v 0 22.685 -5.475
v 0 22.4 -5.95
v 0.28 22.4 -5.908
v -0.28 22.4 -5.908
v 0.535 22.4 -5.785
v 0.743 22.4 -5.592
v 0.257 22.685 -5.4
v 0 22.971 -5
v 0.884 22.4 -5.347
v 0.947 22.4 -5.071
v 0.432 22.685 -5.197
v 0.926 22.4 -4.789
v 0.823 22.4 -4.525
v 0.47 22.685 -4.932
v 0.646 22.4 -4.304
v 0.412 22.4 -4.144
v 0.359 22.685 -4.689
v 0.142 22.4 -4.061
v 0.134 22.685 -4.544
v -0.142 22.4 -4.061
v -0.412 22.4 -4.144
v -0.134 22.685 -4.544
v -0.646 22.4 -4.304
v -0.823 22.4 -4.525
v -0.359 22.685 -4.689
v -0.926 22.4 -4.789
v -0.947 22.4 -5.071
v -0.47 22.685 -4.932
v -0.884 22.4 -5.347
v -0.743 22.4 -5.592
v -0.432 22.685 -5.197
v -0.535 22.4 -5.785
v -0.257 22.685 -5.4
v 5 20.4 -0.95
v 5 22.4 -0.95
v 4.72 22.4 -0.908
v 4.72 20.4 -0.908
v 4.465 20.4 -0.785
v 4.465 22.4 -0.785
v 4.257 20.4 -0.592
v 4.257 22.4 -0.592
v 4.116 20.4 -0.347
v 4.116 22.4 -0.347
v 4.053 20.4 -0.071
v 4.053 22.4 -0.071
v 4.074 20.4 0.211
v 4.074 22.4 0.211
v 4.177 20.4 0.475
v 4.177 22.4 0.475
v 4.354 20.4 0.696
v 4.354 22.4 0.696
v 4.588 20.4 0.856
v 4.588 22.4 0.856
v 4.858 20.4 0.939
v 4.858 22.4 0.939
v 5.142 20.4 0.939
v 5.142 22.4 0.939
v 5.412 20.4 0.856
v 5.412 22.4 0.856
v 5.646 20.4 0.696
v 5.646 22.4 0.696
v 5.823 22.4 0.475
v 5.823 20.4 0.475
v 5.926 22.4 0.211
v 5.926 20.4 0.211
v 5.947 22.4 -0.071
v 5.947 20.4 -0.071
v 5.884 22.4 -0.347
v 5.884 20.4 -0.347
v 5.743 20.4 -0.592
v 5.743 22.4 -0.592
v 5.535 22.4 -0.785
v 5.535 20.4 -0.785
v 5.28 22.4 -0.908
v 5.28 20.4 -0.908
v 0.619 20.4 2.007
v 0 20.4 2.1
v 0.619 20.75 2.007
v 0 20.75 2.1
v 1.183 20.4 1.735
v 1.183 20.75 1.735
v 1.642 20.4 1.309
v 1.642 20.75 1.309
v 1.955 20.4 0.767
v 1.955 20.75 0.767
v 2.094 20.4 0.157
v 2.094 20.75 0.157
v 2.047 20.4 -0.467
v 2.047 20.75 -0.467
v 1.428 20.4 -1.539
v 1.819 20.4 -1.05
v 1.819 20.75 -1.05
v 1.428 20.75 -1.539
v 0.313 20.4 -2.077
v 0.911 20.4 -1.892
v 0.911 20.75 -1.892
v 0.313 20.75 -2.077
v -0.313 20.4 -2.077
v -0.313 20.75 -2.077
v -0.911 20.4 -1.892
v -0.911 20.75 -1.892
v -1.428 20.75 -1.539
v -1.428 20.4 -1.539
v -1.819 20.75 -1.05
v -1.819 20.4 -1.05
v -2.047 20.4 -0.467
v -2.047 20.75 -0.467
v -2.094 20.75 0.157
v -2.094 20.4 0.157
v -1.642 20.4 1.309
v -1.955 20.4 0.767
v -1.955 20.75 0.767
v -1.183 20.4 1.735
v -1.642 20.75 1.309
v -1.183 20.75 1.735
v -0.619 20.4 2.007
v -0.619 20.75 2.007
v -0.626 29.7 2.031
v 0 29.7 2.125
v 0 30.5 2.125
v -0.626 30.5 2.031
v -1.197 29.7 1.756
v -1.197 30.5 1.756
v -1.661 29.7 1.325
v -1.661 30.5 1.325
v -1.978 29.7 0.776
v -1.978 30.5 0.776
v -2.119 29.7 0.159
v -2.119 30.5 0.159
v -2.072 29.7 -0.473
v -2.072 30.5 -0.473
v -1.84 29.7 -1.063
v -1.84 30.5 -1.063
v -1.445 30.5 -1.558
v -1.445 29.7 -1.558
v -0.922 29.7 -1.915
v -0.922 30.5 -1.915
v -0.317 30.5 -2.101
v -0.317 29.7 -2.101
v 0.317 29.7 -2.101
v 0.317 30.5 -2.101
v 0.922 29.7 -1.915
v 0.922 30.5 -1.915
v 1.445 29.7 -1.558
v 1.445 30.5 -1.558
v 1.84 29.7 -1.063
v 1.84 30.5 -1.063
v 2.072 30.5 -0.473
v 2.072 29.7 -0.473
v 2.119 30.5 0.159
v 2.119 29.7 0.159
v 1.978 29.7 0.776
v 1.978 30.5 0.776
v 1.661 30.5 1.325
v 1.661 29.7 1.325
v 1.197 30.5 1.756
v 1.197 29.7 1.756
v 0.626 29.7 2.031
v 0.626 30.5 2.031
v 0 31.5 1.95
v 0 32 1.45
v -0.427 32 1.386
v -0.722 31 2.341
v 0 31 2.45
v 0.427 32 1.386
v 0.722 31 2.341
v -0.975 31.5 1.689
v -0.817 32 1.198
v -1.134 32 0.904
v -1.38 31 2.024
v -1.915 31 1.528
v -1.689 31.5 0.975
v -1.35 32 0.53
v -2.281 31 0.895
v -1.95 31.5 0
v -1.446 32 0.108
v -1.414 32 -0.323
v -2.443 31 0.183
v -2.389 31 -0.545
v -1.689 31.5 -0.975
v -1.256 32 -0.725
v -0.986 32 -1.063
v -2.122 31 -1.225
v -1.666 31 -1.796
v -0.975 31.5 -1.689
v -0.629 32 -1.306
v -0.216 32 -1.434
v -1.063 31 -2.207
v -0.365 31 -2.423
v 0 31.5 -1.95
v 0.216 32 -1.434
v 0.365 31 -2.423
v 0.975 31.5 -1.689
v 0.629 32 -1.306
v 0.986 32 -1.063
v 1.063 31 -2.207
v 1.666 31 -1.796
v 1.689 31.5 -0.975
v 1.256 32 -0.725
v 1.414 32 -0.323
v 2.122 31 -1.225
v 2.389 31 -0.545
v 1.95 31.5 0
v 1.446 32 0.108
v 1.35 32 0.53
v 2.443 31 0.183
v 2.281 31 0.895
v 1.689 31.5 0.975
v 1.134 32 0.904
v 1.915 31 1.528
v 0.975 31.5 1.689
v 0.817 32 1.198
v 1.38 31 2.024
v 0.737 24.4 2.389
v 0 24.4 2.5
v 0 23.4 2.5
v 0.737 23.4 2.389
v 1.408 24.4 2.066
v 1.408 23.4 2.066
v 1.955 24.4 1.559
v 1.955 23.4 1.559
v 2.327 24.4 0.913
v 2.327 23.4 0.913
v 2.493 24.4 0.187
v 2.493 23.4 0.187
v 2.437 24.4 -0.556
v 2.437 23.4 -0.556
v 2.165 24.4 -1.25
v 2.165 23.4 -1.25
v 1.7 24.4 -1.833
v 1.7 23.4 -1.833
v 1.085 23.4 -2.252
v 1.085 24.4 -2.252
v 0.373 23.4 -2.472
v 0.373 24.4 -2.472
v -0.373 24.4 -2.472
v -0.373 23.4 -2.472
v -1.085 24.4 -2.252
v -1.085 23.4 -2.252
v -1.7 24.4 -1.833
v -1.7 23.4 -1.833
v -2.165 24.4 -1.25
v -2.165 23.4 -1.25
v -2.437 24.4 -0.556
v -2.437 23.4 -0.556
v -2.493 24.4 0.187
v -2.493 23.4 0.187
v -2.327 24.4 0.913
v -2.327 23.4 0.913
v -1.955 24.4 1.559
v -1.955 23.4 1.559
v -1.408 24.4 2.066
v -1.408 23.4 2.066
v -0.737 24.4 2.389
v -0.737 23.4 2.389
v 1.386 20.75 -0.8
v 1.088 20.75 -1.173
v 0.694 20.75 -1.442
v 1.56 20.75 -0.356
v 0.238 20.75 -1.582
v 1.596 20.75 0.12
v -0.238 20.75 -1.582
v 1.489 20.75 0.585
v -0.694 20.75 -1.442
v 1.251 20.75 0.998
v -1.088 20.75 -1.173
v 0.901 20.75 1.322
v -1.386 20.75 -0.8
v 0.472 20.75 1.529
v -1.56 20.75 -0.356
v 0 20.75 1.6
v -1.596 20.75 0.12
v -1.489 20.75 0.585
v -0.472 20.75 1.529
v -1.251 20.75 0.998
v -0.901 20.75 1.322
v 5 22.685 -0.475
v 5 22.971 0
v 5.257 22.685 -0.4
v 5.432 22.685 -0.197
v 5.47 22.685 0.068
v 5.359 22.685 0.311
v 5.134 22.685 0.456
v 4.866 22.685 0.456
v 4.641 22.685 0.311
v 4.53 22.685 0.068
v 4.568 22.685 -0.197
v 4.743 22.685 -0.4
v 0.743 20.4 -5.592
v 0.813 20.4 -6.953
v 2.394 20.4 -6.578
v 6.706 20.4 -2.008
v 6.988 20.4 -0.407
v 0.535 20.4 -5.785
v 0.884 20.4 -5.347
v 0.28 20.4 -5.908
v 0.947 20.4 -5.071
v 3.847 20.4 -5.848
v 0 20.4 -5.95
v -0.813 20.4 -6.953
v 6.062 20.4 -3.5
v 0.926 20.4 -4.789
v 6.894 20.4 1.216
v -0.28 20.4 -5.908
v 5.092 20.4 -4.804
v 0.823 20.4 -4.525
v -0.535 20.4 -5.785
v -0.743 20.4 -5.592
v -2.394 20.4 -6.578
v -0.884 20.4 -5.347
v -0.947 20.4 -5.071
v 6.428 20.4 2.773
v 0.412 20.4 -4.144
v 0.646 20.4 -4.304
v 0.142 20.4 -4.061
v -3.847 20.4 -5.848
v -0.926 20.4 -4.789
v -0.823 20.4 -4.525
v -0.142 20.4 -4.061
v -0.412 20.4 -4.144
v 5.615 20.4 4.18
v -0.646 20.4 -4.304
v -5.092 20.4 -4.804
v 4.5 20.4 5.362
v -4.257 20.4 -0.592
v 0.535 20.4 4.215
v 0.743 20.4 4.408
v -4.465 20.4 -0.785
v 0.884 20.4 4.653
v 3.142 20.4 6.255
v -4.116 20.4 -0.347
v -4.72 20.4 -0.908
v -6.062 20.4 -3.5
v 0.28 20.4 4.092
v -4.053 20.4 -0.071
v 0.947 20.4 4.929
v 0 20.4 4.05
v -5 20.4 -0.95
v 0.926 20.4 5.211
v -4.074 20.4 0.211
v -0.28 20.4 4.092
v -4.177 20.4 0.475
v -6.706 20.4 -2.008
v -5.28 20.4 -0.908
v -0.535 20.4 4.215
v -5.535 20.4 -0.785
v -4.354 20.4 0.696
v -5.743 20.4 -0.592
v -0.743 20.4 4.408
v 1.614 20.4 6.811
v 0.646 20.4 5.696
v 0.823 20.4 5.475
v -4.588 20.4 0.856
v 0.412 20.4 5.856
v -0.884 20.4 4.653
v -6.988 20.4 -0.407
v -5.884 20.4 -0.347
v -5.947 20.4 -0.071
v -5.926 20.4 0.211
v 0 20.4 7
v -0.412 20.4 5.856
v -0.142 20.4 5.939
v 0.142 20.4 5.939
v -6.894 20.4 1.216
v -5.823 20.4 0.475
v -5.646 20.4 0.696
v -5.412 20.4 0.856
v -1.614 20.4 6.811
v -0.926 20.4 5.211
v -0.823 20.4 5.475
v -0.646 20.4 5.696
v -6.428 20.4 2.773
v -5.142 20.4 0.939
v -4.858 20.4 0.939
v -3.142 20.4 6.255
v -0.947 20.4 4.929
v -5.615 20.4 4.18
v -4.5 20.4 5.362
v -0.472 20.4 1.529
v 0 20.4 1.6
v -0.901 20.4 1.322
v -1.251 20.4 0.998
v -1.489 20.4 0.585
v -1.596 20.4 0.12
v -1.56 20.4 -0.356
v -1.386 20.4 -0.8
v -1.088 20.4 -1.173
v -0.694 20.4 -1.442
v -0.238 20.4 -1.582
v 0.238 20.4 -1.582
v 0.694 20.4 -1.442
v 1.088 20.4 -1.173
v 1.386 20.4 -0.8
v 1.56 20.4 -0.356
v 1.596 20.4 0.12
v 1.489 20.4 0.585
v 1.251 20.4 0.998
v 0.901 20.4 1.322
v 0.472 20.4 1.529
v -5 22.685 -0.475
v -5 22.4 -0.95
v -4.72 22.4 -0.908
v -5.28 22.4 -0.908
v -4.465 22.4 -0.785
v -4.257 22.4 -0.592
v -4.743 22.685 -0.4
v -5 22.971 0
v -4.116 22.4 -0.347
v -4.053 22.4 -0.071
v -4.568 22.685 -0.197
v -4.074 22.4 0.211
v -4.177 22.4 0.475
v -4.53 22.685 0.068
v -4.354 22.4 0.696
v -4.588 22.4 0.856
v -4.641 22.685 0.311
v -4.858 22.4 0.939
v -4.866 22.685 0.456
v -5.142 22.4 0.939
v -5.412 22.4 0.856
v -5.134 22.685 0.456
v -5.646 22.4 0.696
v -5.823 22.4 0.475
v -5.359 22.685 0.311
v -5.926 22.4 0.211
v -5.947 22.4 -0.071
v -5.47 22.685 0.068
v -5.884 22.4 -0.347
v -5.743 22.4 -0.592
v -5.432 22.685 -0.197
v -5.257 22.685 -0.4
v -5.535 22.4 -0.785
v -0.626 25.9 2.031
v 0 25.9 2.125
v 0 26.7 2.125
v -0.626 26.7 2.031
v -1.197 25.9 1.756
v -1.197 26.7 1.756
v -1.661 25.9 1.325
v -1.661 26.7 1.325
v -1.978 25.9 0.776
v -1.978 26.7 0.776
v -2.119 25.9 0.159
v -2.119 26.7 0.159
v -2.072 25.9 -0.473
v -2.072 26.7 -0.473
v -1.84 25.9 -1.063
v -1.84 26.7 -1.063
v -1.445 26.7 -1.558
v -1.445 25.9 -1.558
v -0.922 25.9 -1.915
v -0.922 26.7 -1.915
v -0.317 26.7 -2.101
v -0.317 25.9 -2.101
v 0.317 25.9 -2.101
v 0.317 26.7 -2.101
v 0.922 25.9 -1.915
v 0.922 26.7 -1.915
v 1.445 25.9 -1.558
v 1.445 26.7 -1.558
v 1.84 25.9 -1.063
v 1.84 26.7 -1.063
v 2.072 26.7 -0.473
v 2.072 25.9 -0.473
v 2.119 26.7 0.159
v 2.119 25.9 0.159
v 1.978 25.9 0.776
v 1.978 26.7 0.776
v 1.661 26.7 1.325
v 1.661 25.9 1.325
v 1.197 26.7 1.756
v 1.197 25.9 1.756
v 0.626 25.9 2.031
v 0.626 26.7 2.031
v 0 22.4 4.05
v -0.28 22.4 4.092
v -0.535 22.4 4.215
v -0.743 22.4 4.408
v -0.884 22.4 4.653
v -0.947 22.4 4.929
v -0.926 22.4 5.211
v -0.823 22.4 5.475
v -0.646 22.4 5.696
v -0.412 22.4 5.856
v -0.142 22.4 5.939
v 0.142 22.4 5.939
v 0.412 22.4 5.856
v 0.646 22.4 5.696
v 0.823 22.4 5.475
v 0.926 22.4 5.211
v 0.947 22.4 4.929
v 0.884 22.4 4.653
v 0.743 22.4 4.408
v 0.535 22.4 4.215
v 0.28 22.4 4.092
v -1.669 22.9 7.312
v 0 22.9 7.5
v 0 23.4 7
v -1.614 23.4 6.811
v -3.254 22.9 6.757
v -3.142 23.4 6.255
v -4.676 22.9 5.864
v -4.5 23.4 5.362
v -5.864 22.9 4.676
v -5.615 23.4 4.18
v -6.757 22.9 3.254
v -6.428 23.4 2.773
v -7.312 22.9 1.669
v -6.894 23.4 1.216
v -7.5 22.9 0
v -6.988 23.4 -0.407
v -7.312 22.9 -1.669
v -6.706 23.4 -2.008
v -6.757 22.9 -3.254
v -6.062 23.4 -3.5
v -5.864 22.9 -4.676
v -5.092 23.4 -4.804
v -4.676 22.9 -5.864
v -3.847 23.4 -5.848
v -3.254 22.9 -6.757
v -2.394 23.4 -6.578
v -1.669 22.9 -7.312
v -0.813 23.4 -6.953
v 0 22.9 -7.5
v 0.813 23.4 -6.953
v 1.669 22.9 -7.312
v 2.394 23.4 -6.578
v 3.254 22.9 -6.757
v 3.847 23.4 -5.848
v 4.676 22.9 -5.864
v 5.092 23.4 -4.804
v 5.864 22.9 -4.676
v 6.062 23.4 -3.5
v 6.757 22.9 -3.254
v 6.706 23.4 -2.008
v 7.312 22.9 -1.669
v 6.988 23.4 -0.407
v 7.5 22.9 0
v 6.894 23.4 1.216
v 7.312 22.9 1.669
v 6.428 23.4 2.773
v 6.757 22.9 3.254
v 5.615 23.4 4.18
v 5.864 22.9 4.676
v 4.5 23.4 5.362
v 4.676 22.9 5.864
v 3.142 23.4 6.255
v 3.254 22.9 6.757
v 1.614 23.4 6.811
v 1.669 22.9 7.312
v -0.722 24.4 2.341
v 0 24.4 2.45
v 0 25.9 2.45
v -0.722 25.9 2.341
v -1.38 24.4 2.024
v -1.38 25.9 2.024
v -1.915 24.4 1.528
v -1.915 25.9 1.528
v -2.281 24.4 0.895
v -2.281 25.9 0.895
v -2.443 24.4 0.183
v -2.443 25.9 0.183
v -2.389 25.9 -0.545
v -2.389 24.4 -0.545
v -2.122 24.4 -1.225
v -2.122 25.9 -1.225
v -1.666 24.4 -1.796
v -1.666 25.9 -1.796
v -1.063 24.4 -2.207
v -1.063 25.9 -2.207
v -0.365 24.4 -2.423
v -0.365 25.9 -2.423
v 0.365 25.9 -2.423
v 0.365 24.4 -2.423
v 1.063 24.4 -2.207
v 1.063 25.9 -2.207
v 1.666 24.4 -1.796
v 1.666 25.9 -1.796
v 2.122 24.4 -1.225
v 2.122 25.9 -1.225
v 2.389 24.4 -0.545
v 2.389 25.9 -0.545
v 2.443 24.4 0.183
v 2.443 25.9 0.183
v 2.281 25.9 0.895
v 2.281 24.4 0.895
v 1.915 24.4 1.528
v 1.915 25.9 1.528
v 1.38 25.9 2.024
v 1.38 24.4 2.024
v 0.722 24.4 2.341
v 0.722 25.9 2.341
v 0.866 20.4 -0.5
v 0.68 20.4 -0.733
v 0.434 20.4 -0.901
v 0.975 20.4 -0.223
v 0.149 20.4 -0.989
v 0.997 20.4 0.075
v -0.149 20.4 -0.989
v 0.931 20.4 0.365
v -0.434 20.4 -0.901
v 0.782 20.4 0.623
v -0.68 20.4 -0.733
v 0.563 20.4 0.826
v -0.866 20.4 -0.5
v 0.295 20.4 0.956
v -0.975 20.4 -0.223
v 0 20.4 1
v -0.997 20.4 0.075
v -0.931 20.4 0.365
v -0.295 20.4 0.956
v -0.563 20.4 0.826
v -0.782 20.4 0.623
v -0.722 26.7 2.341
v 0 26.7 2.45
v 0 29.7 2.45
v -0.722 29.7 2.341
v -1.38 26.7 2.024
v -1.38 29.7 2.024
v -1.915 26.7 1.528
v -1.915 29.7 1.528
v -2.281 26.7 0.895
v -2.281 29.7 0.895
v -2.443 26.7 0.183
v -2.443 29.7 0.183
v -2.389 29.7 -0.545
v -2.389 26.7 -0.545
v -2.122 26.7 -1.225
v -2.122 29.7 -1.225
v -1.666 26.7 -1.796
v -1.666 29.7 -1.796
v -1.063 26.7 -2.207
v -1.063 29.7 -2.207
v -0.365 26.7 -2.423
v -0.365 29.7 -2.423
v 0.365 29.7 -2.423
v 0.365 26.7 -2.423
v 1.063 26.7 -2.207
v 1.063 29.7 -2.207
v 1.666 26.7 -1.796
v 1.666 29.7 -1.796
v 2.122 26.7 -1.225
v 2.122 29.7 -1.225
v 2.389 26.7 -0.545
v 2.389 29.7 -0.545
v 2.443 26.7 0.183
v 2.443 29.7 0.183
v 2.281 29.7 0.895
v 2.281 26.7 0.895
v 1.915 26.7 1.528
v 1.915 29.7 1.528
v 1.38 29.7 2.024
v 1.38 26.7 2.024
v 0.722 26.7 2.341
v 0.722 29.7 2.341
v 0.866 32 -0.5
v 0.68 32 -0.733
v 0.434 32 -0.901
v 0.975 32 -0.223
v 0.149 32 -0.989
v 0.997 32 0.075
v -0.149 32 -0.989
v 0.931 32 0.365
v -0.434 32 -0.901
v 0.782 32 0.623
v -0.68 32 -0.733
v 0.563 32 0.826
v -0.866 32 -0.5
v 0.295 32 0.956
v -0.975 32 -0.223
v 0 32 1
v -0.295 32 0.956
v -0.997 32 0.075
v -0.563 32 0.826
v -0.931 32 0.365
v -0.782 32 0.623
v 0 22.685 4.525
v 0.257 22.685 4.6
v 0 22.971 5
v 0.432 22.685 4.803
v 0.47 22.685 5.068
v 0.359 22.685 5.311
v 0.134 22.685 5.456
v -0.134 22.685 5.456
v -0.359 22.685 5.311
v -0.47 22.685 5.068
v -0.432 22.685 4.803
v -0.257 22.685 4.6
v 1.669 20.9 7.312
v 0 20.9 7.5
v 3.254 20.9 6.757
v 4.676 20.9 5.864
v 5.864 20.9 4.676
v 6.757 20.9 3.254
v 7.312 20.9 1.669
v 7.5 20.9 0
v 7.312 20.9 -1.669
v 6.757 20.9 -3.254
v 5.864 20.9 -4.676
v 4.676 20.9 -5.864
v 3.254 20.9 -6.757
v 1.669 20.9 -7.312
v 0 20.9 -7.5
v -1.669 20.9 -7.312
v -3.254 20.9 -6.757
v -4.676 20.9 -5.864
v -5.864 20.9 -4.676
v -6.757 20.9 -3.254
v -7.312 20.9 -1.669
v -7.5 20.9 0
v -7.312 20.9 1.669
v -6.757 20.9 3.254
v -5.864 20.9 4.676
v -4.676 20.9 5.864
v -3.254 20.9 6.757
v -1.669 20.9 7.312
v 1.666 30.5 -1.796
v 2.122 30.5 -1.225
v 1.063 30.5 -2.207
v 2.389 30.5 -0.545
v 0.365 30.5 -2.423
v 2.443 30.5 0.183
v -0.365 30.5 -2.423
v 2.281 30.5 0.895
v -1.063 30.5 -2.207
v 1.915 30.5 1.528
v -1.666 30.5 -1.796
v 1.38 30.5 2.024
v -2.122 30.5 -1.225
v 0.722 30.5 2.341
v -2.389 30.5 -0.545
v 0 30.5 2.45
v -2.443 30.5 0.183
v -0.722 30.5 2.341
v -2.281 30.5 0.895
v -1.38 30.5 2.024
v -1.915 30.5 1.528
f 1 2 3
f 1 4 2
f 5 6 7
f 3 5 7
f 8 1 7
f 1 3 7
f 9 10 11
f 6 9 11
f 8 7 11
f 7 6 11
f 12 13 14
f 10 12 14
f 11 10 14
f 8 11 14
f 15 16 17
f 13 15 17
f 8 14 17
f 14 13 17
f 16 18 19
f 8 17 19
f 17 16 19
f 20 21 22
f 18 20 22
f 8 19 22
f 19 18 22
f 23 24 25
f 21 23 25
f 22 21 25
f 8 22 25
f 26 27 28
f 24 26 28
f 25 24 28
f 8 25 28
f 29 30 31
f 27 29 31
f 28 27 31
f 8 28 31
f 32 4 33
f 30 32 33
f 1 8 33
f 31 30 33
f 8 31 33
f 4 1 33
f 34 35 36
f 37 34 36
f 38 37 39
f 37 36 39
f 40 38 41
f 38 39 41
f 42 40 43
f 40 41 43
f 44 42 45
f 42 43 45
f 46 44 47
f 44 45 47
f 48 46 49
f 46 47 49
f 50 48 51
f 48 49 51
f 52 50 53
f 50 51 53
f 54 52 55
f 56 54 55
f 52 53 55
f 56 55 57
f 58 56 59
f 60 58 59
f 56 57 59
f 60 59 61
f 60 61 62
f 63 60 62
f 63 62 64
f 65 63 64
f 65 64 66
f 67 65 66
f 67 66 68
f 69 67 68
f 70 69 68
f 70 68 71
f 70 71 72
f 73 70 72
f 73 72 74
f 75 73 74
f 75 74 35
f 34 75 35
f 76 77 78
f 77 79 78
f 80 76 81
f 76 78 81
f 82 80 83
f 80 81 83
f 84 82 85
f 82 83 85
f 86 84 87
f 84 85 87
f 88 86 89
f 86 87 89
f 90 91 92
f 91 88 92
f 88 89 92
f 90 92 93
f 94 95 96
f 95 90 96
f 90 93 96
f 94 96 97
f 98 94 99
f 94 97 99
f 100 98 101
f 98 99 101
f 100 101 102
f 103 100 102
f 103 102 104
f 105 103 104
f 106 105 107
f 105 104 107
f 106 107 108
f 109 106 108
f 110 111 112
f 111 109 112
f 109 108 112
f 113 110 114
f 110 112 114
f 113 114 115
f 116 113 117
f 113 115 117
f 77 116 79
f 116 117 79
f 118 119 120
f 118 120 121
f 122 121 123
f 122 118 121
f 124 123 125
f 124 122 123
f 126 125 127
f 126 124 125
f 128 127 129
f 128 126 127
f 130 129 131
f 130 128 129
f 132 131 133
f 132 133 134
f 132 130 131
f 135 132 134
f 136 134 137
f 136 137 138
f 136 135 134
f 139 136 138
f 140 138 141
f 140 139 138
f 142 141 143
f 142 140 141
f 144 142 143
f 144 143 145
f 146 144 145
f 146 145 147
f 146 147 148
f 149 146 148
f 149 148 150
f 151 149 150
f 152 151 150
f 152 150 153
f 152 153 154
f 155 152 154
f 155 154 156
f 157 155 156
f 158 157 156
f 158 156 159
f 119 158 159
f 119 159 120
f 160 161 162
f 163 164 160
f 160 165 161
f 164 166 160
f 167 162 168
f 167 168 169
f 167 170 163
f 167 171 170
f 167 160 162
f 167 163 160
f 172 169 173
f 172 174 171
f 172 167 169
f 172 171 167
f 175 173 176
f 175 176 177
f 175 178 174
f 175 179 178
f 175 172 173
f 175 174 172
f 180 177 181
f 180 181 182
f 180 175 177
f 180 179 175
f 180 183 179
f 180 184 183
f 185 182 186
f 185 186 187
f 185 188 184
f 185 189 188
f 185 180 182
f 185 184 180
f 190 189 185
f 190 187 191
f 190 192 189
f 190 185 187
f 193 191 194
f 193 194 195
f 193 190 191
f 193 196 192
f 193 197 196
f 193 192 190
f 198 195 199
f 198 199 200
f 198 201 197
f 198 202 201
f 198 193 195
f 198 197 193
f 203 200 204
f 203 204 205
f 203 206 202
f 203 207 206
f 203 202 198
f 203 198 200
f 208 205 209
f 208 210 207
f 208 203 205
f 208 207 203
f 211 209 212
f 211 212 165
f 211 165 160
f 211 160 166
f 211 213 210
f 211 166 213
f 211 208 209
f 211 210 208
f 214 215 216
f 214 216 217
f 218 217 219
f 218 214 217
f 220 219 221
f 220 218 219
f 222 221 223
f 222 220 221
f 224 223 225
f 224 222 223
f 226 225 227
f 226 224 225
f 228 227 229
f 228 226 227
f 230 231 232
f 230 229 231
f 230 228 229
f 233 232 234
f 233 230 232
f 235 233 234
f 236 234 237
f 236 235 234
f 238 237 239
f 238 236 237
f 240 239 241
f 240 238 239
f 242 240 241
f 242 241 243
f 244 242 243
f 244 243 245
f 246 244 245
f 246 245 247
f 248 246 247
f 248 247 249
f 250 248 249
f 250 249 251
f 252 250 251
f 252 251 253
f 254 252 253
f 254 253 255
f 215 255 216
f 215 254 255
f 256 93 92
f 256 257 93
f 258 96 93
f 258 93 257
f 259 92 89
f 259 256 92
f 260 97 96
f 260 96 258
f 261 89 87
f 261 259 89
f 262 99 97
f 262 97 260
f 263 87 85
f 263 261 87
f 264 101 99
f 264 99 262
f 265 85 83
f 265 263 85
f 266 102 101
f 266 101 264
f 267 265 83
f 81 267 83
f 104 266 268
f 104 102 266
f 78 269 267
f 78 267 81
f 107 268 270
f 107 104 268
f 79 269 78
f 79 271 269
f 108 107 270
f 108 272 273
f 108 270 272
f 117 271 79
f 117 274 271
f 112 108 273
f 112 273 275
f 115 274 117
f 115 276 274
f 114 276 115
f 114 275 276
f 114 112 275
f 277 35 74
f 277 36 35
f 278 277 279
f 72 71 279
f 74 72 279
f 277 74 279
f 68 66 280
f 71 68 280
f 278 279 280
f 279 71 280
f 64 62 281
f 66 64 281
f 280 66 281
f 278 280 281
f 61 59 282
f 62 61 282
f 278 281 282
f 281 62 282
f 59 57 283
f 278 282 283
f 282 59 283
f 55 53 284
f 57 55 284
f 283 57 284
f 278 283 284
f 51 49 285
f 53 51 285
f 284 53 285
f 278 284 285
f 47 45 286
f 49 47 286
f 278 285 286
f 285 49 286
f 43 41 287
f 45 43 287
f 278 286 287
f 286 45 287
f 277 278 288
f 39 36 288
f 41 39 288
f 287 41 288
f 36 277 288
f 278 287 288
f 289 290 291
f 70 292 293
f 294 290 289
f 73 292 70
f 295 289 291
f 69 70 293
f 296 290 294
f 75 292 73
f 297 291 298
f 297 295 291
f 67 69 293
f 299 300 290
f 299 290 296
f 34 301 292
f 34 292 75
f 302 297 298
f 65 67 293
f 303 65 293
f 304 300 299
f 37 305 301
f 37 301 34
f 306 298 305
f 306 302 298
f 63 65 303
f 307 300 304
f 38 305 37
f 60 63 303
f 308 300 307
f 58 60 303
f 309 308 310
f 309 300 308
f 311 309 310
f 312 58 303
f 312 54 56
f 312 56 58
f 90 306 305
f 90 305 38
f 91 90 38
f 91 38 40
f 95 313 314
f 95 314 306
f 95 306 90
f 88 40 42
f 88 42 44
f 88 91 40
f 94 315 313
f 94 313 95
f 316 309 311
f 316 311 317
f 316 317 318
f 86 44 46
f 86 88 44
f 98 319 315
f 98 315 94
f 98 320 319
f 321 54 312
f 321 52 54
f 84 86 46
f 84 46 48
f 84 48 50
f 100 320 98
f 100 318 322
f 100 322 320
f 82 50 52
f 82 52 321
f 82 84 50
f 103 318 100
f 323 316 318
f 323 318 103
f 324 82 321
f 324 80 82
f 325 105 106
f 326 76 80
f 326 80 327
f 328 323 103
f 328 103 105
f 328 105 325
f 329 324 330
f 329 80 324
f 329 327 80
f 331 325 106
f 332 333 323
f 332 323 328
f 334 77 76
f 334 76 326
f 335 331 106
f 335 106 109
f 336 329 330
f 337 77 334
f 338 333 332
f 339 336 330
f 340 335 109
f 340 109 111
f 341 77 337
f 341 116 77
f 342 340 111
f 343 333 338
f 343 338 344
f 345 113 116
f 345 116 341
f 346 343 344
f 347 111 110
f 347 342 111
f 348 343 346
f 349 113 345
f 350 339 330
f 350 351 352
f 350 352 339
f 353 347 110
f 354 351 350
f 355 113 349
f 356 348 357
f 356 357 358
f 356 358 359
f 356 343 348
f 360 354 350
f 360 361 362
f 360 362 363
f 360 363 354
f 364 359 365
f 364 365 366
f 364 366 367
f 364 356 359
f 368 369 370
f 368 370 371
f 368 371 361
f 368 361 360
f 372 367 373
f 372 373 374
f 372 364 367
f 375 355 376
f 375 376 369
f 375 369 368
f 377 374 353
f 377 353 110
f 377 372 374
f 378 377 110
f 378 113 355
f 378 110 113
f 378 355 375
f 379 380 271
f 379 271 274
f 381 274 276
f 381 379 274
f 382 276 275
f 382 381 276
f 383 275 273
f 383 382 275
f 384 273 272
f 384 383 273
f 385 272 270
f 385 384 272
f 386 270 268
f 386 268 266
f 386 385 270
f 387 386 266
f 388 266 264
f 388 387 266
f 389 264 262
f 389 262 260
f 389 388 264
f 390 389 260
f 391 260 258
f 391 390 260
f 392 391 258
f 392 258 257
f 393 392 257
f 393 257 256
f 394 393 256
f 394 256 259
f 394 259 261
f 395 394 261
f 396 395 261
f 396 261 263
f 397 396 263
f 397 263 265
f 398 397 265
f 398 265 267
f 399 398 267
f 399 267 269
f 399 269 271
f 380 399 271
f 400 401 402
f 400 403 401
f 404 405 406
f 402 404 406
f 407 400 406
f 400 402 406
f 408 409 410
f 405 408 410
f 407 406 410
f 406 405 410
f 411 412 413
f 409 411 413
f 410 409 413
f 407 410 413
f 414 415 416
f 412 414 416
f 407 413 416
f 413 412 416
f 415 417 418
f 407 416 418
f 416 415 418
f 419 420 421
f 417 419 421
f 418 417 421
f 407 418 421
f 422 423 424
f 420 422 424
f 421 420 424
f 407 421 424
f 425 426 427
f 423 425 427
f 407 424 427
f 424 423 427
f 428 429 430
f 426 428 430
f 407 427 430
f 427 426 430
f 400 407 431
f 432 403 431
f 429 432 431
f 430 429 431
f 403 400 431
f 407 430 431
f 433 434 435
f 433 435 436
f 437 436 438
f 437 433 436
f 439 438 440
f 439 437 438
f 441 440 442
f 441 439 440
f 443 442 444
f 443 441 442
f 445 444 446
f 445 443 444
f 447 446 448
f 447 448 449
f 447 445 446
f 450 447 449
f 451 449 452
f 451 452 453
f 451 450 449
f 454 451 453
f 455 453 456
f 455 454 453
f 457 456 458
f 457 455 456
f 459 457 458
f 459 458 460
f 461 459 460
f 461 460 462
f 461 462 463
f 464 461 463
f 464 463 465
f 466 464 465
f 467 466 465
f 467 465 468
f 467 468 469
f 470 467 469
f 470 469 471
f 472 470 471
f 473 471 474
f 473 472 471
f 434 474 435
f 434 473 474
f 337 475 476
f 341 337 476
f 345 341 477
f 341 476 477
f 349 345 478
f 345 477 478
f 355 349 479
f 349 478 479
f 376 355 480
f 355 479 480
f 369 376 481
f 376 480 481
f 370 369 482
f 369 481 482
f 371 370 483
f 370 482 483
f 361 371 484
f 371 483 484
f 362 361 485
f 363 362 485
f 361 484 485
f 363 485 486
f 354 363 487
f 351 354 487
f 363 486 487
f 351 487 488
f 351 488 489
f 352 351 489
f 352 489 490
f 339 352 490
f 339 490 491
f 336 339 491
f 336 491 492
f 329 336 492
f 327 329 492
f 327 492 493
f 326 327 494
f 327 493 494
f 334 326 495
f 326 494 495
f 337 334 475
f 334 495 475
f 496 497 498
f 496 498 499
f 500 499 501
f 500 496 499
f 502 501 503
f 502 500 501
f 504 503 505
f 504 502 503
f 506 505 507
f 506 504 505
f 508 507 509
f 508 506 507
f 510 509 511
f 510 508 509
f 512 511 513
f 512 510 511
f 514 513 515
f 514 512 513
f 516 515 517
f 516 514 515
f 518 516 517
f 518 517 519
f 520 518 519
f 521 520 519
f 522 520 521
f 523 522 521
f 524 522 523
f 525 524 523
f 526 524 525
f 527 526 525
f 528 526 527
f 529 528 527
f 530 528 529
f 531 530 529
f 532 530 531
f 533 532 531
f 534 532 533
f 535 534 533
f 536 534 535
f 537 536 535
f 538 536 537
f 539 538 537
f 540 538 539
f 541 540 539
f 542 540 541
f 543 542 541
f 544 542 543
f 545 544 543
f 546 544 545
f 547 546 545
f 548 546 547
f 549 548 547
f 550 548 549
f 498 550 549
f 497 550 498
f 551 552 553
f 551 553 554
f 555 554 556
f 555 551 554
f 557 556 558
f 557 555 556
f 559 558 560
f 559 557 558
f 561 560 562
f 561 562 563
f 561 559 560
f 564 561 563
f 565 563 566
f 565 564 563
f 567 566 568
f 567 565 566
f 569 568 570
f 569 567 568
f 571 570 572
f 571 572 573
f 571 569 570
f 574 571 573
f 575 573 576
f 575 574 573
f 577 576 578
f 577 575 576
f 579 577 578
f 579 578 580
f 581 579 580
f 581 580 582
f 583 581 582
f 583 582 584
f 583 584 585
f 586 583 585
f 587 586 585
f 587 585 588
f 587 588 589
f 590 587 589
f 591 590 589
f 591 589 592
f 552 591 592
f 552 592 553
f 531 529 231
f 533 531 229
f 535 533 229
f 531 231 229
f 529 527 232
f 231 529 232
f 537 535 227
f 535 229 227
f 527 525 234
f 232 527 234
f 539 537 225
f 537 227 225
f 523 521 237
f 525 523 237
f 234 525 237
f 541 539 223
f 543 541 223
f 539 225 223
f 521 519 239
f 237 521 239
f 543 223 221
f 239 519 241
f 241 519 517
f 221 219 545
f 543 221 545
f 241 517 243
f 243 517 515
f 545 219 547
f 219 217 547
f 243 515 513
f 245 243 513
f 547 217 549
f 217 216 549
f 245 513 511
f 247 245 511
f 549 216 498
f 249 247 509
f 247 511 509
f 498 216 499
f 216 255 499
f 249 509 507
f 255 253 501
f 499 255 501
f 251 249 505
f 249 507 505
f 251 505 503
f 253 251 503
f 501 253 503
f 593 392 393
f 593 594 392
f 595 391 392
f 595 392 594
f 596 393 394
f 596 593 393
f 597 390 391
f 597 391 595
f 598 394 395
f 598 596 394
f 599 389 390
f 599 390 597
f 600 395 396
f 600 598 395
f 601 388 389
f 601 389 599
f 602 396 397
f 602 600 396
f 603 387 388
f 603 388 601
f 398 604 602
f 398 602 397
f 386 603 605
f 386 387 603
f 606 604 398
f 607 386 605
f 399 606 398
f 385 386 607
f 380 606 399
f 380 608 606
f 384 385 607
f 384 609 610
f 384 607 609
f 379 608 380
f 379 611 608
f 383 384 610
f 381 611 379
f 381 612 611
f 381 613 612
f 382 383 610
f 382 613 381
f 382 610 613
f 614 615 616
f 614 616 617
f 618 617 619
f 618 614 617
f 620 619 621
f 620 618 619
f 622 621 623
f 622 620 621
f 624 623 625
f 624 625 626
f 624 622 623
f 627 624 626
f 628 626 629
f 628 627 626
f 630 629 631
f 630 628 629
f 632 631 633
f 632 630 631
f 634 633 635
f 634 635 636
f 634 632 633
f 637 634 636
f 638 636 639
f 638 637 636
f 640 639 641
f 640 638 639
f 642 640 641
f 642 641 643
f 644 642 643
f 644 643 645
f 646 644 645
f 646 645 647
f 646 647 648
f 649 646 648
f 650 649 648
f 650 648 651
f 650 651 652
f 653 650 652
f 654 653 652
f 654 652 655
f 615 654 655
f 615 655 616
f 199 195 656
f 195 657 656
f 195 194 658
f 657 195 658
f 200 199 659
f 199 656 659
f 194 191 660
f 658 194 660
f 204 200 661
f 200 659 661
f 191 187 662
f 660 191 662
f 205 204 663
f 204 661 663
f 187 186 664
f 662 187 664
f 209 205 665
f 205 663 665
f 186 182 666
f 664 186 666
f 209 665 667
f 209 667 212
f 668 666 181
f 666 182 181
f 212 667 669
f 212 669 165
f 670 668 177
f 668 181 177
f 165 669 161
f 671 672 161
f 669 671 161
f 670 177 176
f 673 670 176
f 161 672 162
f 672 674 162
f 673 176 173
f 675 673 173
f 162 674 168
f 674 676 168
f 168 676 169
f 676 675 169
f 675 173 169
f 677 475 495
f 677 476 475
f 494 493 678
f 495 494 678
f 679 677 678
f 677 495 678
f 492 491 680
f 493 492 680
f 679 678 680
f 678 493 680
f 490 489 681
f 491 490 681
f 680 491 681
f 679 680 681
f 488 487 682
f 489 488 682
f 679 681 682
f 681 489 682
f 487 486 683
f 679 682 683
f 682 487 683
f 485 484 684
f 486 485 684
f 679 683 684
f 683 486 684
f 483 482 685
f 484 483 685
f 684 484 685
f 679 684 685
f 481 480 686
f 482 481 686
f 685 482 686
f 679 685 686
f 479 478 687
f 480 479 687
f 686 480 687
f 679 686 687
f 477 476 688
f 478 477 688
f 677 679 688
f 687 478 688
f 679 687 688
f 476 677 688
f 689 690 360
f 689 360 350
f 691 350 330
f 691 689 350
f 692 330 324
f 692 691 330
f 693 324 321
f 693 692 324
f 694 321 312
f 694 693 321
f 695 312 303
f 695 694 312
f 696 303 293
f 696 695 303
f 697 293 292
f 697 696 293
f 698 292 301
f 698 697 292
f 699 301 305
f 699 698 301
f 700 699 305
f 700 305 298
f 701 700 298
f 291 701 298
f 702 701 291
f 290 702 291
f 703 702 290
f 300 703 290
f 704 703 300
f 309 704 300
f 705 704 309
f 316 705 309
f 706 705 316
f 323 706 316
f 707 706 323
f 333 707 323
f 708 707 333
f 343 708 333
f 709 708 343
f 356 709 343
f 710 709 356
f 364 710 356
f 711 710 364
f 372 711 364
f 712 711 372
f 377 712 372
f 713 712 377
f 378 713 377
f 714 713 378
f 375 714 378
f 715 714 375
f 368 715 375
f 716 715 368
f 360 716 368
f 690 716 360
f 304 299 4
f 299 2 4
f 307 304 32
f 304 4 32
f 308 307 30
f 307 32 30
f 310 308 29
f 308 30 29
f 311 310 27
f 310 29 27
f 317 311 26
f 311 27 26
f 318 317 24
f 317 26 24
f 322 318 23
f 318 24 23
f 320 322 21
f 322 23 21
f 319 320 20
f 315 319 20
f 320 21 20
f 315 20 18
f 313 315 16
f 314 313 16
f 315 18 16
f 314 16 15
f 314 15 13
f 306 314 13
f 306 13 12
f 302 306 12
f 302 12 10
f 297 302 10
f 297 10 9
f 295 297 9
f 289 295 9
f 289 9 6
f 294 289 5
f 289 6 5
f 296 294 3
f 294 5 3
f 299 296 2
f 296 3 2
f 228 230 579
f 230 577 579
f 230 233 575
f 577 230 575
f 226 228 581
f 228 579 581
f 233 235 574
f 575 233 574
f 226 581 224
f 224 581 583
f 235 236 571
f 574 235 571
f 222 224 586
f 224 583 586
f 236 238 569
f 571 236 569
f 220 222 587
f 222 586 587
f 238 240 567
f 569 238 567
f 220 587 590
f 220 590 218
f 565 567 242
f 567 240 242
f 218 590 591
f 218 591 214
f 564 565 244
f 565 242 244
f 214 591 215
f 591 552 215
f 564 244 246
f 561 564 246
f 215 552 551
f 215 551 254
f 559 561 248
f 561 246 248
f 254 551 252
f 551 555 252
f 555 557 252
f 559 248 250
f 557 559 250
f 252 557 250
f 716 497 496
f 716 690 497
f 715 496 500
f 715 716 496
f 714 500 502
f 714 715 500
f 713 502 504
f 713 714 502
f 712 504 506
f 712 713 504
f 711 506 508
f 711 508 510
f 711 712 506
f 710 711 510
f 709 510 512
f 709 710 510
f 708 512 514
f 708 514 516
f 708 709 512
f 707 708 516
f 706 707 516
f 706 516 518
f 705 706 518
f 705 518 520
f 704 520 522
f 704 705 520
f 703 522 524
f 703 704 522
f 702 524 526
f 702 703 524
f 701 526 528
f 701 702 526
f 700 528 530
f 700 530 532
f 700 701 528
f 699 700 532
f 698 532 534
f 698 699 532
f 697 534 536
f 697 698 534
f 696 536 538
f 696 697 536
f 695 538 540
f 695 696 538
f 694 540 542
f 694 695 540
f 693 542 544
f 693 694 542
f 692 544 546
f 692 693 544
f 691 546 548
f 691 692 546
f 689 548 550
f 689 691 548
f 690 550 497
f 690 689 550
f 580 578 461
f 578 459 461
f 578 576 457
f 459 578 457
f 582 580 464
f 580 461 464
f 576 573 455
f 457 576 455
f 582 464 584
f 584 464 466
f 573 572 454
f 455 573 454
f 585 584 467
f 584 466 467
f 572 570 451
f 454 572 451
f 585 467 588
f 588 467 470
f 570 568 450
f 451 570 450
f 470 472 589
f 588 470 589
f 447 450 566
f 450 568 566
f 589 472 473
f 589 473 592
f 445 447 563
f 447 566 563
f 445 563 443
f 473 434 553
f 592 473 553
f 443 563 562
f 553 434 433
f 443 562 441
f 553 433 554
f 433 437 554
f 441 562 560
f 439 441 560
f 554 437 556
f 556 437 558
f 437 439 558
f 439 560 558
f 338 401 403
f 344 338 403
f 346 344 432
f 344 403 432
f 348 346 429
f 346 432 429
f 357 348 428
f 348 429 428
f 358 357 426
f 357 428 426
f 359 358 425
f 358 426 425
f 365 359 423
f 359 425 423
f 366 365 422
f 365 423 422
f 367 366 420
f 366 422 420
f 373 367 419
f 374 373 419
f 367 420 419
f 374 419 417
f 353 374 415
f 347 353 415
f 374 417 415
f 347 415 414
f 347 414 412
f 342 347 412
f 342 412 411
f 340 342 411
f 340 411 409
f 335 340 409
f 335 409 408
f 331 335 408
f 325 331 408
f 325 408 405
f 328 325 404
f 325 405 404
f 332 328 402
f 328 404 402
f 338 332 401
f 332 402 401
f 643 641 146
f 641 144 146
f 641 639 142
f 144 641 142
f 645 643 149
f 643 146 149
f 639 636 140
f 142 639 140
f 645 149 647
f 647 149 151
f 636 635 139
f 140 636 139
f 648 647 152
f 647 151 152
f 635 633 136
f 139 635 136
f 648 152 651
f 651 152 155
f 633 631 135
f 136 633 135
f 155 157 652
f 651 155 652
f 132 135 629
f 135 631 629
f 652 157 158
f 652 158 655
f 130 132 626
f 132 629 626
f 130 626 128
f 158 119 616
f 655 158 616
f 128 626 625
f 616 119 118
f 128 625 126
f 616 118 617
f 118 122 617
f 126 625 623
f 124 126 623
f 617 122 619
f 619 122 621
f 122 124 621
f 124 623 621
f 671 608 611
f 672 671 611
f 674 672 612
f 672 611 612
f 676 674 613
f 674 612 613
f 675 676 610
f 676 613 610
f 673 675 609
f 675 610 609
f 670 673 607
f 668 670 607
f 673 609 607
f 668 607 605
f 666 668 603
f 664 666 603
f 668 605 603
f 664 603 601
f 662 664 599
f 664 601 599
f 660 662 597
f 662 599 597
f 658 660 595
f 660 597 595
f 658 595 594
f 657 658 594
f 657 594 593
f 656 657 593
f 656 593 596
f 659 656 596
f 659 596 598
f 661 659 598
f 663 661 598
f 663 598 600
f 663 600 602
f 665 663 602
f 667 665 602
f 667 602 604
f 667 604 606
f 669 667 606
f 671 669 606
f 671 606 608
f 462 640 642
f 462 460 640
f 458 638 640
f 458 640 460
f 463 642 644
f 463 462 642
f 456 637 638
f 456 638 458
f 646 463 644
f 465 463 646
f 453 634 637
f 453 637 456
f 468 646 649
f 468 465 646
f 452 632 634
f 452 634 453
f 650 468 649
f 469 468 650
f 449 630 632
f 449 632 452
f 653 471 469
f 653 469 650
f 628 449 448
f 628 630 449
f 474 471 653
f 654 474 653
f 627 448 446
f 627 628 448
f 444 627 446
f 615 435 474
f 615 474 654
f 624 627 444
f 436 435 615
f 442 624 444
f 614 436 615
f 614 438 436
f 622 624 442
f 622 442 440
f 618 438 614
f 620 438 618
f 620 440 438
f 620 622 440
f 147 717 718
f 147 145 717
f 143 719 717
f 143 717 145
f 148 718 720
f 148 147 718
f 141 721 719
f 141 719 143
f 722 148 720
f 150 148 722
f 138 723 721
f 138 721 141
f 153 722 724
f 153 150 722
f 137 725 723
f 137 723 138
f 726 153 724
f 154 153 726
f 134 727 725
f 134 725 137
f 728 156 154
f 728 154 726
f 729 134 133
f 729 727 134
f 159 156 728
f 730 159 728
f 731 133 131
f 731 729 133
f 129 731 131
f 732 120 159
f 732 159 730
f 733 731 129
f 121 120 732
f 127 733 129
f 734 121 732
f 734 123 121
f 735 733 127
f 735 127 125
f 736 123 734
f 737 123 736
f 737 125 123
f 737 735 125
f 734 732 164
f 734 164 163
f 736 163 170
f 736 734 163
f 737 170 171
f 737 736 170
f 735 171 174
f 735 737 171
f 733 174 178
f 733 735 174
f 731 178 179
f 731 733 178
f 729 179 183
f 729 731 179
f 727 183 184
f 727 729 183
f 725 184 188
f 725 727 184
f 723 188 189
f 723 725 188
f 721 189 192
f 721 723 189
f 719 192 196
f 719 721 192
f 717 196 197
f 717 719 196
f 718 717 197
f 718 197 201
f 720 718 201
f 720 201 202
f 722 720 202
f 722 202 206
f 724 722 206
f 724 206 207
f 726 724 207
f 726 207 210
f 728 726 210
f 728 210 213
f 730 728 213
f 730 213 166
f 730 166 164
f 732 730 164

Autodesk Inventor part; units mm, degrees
sketch "Sketch1" plane through (0, 0, 0) normal (1, 0, 0) x (0, 1, 0)
  line L0 (20.75, 2.1) -> (20.75, 1.7)
  line L1 (20.4, 1.6) -> (20.4, 0)
  line L2 (31, 0) -> (20.4, 0)
  line L3 (23.4, 7.5) -> (20.4, 7.5)
  line L4 (20.4, 7.5) -> (20.4, 2.2)
  line L5 (20.75, 1.95) -> (20.75, 1.7)
  line L6 (20.75, 1.7) -> (20.75, 1.65)
  line L7 (20.4, 2.2) -> (20.4, 2.15)
  line L8 (20.75, 1.65) -> (20.75, 1.6)
  line L9 (20.75, 1.6) -> (20.4, 1.6)
  line L10 (20.4, 2.15) -> (20.4, 2.1)
  line L11 (20.4, 2.1) -> (20.75, 2.1)
  line L12 (31, 0) -> (32, 0)
  line L13 (32, 0) -> (32, 2.45)
  line L14 (32, 2.45) -> (30.5, 2.45)
  line L15 (30.5, 2.45) -> (30.5, 2.125)
  line L16 (30.5, 2.125) -> (29.7, 2.125)
  line L17 (29.7, 2.125) -> (29.7, 2.45)
  line L18 (29.7, 2.45) -> (26.7, 2.45)
  line L19 (26.7, 2.45) -> (26.7, 2.125)
  line L20 (26.7, 2.125) -> (25.9, 2.125)
  line L21 (25.9, 2.125) -> (25.9, 2.45)
  line L22 (25.9, 2.45) -> (24.4, 2.45)
  line L23 (23.4, 2.5) -> (24.4, 2.5)
  line L24 (24.4, 2.5) -> (24.4, 2.45)
  line L25 (23.4, 2.5) -> (23.4, 7.5)
  line L26 (32, 2.45) -> (31, 2.45)
  line L27 (32, 2.45) -> (32, 1.45)
  point P0 (0, 0)
  dimension "d305" = 3
  dimension "d306" = 5.3
  dimension "d326" = 0.05
  dimension "d329" = 1.6
  dimension "d330" = 0.5
  dimension "d331" = 0.35
  dimension "d344" = 1
  dimension "d345" = 1.5
  dimension "d346" = 0.325
  dimension "d347" = 0.8
  dimension "d348" = 3
  dimension "d349" = 0.325
  dimension "d350" = 0.8
  dimension "d351" = 2.45
  dimension "d353" = 1
  dimension "d354" = 1
  dimension "d355" = 1
revolve "Revolution1" add sketch "Sketch1" angle 360 about axis through (0, 31, 0) along (0, -1, 0)
sketch "Sketch11" plane through (0, 20.4, 0) normal (0, -1, 0) x (1, 0, 0)
  line L0 (0, 0) -> (0, -5)
  line L1 (0, 0) -> (-5, 0)
  line L2 (0, 0) -> (0, 5)
  line L3 (0, 0) -> (5, 0)
  dimension "d309" = 5
  dimension "d310" = 5
  dimension "d311" = 5
  dimension "d312" = 5
hole "Hole9" at (0, 20.4, -5) at (-5, 20.4, 0) at (0, 20.4, 5) at (5, 20.4, 0) direction (0, 1, 0) diameter 1.9 depth 2 tip angle 118
chamfer "Chamfer6" distance 0.5 angle 45 2 edges at (0, 23.4, -7.5) (0, 20.4, -7.5)
sketch "Sketch12" plane through (0, 20.4, 0) normal (0, -1, 0) x (1, 0, 0)
  circle A0 centre (0, 0) radius 0.9439
  line L0 (0, 0) -> (-21.4854, 21.4854)
  line L1 (0, 0) -> (30.3849, 0) construction
  dimension "d324" = 135
ref_plane "Work Plane6" through (0, 20.4, 0) normal (0, -1, 0) x (1, 0, 0)
ref_plane "Work Plane7" through (0, 20.75, 0) normal (0, -1, 0) x (1, 0, 0)
thread "Thread17" size "M2x0.4" class "6H" standard "ANSI Metric M Profile" full length
thread "Thread18" size "M2x0.4" class "6H" standard "ANSI Metric M Profile" full length
thread "Thread19" size "M2x0.4" class "6H" standard "ANSI Metric M Profile" full length
thread "Thread20" size "M2x0.4" class "6H" standard "ANSI Metric M Profile" full length
chamfer "Chamfer8" distance 1 angle 45 1 edges at (0, 32, -2.45)
sketch "Sketch13" plane through (0, 32, 0) normal (0, 1, 0) x (1, 0, 0)
  circle A0 centre (0, 0) radius 1
  dimension "d359" = 2
hole "Hole10" at (0, 32, 0) direction (0, -1, 0) diameter 2 end through all
ref_plane "Work Plane8" through (0, 26.3, 0) normal (0, 1, 0) x (1, 0, 0)
ref_plane "Work Plane9" through (0, 30.1, 0) normal (0, 1, 0) x (1, 0, 0)
properties part number "None_Magnet_Extender_Split_Top" material "Aluminum 6061"
